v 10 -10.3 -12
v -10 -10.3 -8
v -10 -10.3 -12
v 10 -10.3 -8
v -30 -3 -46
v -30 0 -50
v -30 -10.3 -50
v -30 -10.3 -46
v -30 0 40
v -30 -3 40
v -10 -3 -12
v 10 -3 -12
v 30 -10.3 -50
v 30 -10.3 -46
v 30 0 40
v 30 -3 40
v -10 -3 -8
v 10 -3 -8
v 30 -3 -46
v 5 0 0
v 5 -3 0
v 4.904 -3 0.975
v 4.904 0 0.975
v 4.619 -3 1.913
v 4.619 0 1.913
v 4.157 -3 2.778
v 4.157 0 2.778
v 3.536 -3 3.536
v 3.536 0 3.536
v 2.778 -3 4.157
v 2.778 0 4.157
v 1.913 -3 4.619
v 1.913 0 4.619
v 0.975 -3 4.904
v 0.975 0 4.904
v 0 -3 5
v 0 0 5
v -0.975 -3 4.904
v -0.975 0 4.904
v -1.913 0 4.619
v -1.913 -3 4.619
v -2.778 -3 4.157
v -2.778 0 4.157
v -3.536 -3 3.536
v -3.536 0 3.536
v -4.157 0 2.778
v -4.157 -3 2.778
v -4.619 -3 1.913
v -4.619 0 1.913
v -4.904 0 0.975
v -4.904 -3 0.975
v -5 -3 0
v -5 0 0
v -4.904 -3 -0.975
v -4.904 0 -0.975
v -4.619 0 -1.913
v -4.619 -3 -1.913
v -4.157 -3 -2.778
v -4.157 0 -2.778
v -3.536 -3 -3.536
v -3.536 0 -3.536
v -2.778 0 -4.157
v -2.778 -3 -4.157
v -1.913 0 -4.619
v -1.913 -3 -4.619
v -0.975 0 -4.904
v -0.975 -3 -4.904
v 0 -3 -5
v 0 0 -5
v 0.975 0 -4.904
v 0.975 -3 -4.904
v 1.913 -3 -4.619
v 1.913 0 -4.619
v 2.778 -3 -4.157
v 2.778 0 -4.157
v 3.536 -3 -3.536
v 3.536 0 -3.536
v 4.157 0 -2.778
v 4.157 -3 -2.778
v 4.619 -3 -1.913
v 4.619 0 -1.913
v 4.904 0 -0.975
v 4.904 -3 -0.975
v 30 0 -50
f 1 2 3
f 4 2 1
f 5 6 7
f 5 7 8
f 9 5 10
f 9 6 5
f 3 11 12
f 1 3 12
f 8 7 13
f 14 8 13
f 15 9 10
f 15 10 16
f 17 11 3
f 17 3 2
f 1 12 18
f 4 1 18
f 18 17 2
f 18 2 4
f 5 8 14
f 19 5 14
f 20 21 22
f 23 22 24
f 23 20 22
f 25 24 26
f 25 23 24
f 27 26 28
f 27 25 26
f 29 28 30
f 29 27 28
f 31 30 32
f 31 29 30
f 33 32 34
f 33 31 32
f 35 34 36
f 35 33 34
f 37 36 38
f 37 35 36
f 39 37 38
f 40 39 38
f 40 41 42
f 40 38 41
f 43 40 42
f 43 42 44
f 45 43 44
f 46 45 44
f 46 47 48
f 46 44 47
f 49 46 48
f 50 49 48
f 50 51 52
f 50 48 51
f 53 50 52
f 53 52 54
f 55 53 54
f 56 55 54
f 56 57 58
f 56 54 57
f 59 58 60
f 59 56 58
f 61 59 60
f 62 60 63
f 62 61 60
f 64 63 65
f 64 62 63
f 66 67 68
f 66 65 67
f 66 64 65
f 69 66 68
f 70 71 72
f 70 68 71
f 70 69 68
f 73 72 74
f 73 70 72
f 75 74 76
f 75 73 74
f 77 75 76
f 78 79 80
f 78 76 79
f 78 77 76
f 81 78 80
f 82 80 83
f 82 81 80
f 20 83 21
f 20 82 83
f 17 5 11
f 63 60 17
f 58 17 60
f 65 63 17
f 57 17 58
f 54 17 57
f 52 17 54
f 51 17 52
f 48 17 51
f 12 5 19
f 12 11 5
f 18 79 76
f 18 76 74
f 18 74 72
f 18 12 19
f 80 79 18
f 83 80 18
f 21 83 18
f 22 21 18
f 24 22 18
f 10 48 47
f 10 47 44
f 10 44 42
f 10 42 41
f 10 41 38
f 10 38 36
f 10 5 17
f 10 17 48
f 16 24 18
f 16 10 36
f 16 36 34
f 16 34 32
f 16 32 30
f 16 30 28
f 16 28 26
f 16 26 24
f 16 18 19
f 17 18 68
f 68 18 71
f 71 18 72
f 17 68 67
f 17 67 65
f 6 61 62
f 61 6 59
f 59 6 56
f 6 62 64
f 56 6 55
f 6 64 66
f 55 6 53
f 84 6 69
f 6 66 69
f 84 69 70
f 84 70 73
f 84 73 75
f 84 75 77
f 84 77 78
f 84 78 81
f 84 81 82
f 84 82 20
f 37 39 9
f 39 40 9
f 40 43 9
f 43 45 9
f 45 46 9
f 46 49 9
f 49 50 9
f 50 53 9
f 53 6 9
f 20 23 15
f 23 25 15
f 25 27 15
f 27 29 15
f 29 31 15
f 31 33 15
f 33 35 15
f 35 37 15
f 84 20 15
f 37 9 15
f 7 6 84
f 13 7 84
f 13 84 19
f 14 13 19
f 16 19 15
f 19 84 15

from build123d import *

# Parameters (mm, degrees)
F0_W     = 60
F0_H     = 90
F2_DEPTH = 3
F1_R     = 5
F3_DEPTH = 25.4
F4_W     = 60
F4_H     = 10.3
F5_DEPTH = 4
F6_W     = 20
F6_H     = 4
F7_DEPTH = 10.3


with BuildPart() as f2:
    # F0 (on Front) → F2 (new body)
    with BuildSketch(Plane.XZ):
        with Locations((0, -5)):
            Rectangle(F0_W, F0_H)
    extrude(amount=F2_DEPTH)

    # F1 (on face) → F3 (cut)
    with BuildSketch(Plane.XZ):
        Circle(F1_R)
    extrude(amount=F3_DEPTH, mode=Mode.SUBTRACT)

    # F4 (on face) → F5 (join)
    with BuildSketch(Plane(origin=(0, 0, -50), x_dir=(1, 0, 0), z_dir=(0, 0, -1))):
        with Locations((0, 5.15)):
            Rectangle(F4_W, F4_H)
    extrude(amount=-F5_DEPTH)

    # F6 (on Front) → F7 (join)
    with BuildSketch(Plane.XZ):
        with Locations((0, -10)):
            Rectangle(F6_W, F6_H)
    extrude(amount=F7_DEPTH)


solid = f2.part
